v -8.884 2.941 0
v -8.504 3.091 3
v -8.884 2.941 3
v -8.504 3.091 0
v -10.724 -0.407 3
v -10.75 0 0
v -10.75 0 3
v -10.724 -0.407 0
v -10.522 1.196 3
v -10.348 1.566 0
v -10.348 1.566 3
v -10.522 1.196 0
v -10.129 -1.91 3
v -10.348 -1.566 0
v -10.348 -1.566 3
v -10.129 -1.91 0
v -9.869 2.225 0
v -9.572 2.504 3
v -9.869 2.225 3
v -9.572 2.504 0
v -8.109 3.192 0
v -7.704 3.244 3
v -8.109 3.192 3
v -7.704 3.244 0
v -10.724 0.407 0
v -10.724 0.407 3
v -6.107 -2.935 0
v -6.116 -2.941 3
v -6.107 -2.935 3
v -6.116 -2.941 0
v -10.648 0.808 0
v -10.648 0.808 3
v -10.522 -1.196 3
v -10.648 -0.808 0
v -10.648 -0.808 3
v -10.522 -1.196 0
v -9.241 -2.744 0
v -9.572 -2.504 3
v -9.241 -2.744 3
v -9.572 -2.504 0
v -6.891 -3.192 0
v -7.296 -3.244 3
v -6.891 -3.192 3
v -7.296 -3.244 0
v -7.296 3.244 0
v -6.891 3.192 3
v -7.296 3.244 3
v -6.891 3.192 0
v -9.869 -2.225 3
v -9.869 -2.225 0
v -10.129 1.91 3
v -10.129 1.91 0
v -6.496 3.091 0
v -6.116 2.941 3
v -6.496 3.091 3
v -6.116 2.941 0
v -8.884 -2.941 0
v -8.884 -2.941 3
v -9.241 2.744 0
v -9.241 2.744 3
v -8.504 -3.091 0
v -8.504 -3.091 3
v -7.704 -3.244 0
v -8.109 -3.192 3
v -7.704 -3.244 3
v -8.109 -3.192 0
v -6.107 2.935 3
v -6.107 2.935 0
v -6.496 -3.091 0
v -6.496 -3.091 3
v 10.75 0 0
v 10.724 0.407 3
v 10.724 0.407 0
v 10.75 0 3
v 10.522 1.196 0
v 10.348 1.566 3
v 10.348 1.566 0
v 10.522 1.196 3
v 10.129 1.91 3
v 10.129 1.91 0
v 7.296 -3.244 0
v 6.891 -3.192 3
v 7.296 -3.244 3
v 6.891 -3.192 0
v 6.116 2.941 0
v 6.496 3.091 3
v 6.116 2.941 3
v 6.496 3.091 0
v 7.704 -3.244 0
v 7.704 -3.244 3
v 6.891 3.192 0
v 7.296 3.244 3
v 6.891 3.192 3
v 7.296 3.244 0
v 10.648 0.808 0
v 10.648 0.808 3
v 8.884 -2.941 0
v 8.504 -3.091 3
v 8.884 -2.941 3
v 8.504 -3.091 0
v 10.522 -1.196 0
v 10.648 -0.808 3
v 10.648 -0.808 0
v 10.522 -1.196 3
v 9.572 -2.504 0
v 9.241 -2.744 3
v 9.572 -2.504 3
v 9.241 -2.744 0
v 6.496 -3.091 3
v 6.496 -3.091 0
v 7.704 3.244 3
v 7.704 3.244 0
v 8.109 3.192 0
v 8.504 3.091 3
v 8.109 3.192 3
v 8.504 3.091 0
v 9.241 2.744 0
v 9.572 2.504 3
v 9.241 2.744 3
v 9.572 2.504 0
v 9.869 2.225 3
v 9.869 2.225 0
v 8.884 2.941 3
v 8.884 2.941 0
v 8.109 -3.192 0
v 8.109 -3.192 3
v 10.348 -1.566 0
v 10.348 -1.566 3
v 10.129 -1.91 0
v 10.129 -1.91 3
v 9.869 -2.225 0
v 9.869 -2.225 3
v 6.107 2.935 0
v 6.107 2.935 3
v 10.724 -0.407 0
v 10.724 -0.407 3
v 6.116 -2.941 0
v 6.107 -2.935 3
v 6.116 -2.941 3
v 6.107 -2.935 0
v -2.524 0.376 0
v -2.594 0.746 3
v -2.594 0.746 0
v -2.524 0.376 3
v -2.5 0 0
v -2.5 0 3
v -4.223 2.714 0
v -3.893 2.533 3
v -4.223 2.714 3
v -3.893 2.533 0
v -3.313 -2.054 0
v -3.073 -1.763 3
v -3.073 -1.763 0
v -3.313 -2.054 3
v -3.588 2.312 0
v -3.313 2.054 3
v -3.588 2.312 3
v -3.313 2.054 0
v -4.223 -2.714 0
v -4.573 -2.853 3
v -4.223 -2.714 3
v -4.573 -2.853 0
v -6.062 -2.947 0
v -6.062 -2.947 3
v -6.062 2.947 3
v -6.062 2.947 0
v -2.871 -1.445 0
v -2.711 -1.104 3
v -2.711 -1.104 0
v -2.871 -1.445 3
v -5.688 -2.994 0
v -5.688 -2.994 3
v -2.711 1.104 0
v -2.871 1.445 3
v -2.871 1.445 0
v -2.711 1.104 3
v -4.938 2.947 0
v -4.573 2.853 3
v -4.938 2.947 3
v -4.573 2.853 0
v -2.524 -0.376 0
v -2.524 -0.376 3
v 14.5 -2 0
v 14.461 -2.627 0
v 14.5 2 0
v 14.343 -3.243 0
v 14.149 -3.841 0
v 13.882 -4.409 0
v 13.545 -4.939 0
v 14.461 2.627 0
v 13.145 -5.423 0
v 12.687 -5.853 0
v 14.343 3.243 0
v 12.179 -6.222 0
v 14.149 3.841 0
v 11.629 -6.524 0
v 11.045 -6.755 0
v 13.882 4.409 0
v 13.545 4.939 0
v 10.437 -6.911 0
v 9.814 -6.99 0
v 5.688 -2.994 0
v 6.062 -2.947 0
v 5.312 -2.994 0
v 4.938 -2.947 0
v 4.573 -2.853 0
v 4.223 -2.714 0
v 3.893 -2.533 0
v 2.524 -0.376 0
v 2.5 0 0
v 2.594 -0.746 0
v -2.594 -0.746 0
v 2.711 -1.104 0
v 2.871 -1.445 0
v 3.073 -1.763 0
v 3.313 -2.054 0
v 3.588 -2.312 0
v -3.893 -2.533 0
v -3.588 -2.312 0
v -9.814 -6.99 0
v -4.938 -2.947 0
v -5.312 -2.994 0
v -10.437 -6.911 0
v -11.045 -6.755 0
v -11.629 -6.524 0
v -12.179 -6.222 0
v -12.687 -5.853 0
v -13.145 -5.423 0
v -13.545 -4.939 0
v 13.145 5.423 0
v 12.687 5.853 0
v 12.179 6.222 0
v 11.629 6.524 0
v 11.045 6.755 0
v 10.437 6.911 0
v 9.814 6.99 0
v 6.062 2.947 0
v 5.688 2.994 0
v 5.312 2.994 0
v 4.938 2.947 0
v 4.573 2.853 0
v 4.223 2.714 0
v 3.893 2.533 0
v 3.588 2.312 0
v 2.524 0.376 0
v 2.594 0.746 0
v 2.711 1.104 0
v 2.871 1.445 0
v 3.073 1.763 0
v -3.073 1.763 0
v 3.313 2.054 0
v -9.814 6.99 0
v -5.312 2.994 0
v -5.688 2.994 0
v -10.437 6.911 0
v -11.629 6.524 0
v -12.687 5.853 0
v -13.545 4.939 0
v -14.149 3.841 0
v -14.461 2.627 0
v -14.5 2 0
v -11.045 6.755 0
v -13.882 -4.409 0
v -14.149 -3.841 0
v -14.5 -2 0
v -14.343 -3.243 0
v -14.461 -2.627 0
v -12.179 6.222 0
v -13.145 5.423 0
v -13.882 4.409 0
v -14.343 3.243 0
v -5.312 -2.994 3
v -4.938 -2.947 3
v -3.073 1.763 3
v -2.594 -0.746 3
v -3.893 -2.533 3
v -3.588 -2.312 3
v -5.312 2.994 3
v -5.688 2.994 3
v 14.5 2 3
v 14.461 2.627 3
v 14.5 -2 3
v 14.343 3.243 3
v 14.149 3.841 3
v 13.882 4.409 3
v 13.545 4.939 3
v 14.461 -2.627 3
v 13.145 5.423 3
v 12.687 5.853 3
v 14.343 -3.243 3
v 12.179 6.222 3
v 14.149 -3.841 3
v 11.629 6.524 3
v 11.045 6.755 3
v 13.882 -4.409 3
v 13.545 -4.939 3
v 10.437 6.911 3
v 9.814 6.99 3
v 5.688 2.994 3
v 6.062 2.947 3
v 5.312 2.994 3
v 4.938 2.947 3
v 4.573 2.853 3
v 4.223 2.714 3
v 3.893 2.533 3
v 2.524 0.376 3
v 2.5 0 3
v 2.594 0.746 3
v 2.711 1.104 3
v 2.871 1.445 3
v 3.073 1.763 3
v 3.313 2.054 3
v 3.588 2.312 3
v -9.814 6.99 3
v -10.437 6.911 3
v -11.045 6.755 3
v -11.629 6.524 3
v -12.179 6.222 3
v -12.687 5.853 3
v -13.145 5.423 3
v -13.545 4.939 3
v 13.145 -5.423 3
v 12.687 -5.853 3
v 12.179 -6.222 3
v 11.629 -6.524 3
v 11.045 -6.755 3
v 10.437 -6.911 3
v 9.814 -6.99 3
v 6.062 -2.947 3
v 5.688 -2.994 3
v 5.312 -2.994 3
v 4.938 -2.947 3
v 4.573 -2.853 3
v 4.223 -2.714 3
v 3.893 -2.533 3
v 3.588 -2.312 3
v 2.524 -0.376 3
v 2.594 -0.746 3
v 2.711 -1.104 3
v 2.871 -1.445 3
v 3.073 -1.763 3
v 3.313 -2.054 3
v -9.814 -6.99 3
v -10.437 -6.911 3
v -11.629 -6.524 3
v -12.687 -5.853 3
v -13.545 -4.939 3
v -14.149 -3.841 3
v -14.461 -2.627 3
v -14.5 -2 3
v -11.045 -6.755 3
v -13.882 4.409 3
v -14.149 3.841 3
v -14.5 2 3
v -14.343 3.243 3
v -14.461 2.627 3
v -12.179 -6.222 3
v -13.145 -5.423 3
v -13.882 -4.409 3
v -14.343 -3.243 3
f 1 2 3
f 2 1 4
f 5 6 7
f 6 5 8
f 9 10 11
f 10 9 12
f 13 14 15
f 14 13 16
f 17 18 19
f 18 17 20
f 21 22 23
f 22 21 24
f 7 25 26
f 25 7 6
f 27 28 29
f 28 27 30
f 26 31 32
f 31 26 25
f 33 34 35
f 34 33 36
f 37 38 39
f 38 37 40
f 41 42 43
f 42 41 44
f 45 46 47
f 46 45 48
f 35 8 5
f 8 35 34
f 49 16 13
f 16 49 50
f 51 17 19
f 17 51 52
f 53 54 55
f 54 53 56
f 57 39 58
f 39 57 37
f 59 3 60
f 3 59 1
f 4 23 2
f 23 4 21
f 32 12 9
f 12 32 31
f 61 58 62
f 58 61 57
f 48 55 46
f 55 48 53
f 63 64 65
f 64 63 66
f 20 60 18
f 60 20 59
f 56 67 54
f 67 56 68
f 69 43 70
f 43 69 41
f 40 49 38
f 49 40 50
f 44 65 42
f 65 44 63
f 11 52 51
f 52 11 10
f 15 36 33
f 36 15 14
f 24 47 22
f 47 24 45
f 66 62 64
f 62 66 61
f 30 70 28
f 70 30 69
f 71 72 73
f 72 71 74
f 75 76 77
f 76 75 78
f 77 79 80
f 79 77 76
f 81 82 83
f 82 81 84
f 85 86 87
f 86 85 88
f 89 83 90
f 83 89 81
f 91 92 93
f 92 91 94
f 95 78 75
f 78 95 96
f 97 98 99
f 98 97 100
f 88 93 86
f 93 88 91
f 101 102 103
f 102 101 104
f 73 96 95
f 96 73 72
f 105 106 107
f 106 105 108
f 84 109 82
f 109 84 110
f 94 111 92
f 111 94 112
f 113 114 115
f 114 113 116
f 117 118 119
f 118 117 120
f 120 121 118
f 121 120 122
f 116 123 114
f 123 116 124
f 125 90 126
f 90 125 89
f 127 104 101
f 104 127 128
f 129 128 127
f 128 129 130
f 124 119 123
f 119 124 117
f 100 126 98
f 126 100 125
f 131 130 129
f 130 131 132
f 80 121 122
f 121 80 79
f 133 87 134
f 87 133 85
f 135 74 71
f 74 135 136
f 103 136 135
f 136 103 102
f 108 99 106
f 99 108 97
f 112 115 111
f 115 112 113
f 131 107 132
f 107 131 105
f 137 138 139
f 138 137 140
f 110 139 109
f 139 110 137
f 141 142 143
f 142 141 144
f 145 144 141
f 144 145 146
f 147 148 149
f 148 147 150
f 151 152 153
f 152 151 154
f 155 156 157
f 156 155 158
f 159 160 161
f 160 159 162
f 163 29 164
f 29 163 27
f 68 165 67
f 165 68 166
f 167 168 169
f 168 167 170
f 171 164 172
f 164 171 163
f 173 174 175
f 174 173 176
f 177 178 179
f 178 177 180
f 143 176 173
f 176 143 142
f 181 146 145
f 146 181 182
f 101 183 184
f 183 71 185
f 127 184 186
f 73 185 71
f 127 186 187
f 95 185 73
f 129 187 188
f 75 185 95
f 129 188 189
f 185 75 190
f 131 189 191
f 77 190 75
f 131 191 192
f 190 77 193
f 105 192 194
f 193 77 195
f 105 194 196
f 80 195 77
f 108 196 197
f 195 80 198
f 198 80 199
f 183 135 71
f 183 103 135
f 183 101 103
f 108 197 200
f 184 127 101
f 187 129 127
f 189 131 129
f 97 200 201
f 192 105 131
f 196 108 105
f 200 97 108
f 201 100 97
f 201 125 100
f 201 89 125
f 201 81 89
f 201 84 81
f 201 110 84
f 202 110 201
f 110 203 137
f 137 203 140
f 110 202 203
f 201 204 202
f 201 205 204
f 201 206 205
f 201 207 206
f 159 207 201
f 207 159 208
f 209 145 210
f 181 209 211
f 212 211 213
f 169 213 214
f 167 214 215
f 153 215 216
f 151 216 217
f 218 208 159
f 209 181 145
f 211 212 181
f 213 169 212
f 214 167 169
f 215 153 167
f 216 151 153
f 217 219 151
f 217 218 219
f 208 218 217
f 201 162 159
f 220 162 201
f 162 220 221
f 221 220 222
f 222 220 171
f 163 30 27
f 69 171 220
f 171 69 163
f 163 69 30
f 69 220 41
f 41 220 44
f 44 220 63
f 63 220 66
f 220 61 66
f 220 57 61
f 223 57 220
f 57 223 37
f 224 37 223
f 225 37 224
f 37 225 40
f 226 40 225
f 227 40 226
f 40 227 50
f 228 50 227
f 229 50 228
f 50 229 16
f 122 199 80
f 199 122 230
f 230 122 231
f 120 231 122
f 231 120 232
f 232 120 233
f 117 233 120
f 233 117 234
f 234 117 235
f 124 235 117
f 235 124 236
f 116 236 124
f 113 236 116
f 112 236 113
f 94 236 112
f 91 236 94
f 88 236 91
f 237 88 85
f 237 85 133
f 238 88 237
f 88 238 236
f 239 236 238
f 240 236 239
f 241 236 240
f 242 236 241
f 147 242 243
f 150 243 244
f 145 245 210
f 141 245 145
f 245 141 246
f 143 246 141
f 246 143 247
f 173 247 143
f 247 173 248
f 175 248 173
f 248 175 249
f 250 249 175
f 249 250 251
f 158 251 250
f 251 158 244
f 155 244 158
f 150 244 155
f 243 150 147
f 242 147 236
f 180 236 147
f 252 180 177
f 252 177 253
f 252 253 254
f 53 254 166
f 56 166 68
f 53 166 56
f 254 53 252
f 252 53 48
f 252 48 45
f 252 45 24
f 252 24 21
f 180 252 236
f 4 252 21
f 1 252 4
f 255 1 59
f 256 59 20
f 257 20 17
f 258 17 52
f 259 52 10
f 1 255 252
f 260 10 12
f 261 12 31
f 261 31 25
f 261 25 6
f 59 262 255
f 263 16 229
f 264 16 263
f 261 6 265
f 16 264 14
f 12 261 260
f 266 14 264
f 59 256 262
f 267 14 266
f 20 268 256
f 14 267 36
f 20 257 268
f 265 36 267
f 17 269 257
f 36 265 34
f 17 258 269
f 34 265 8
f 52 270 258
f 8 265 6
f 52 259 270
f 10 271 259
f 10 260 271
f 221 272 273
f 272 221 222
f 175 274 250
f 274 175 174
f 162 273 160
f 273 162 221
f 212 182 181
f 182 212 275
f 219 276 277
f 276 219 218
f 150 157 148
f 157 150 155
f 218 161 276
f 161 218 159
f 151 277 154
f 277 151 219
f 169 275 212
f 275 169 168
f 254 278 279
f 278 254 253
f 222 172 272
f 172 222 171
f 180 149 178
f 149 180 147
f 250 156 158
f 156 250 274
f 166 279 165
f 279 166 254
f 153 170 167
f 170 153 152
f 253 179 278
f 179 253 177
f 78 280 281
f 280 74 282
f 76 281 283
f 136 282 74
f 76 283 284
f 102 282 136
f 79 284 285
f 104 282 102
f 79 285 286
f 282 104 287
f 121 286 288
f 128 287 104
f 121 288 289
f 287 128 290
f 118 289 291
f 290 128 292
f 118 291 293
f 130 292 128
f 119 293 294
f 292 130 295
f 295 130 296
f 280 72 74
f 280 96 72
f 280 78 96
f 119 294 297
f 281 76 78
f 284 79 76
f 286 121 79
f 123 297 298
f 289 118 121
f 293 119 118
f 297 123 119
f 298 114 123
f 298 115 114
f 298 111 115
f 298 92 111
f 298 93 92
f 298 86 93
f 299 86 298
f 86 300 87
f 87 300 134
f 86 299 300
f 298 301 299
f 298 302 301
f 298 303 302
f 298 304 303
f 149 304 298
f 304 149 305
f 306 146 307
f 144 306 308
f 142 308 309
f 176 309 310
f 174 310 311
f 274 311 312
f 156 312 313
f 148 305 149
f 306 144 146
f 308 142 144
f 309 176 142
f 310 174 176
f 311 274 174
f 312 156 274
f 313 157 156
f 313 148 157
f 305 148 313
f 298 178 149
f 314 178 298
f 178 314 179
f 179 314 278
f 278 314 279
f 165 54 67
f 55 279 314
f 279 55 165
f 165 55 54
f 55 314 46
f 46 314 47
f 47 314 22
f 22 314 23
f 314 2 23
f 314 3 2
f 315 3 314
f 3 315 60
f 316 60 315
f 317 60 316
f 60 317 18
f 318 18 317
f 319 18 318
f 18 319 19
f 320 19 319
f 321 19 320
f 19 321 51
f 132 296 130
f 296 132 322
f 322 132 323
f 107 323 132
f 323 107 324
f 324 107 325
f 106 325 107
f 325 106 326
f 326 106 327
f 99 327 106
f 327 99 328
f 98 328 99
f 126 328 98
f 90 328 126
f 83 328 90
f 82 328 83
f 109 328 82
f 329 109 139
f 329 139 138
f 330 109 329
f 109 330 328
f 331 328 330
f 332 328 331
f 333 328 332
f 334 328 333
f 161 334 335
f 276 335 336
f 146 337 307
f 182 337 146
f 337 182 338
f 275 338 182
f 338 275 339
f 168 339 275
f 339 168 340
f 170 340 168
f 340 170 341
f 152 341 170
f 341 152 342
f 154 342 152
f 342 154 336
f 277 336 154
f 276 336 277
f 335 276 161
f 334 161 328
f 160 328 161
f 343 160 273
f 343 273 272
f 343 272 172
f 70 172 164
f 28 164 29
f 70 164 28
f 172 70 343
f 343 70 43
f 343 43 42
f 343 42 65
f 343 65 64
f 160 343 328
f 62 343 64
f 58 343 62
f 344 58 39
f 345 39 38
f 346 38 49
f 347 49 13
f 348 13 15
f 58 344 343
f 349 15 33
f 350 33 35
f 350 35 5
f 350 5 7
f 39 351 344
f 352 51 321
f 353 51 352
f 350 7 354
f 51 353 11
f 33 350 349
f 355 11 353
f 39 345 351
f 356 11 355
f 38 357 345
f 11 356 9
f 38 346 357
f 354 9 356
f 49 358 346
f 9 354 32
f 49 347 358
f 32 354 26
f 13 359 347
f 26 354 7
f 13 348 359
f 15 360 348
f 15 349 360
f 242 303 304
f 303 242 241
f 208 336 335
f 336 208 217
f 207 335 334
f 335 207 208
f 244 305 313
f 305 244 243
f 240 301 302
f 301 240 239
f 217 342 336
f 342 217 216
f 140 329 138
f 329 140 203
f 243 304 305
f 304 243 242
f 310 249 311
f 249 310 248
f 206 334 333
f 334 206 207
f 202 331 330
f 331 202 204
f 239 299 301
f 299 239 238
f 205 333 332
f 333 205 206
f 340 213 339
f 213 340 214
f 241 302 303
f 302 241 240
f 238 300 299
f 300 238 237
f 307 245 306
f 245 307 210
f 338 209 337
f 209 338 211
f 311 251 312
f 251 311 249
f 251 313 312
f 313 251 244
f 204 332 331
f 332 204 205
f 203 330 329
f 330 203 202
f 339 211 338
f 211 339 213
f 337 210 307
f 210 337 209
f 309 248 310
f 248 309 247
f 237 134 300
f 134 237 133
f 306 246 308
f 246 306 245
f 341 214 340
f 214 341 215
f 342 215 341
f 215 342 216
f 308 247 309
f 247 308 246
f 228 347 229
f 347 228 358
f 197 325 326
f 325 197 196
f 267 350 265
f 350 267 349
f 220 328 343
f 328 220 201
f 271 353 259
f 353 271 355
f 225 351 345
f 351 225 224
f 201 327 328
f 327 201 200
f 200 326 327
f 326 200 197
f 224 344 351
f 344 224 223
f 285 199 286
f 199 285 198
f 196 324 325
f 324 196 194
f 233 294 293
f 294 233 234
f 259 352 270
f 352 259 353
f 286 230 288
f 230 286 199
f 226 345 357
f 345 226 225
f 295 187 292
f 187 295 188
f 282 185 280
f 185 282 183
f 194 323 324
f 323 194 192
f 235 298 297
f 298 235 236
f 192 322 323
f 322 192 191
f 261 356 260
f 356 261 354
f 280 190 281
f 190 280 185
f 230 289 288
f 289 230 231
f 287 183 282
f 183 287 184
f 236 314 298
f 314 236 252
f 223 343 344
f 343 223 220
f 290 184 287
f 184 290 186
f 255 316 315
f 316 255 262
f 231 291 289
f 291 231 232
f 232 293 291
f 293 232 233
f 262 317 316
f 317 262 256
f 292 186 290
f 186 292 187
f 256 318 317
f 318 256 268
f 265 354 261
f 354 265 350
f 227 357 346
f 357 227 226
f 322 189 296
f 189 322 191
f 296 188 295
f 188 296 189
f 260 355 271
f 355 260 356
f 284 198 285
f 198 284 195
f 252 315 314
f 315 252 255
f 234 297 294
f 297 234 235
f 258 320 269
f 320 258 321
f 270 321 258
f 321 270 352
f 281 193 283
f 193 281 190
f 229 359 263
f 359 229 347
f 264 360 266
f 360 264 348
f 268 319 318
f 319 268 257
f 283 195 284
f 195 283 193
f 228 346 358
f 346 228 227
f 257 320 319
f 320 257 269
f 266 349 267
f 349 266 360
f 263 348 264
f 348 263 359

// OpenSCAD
$fn = 50;

difference() {
	union() {
		hull() {
			translate(v = [-9.5, 2.0, 0]) {
				cylinder(h = 3, r = 5);
			}
			translate(v = [9.5, 2.0, 0]) {
				cylinder(h = 3, r = 5);
			}
			translate(v = [-9.5, -2.0, 0]) {
				cylinder(h = 3, r = 5);
			}
			translate(v = [9.5, -2.0, 0]) {
				cylinder(h = 3, r = 5);
			}
		}
	}
	union() {
		translate(v = [-7.5, 0.0, -100.0]) {
			cylinder(h = 200, r = 3.25);
		}
		translate(v = [7.5, 0.0, -100.0]) {
			cylinder(h = 200, r = 3.25);
		}
		translate(v = [-7.5, 0.0, -100.0]) {
			cylinder(h = 200, r = 1.8);
		}
		translate(v = [7.5, 0.0, -100.0]) {
			cylinder(h = 200, r = 1.8);
		}
		translate(v = [-5.5, 0, 0.0]) {
			cylinder(h = 3, r = 3.0);
		}
		translate(v = [5.5, 0, 0.0]) {
			cylinder(h = 3, r = 3.0);
		}
	}
}
